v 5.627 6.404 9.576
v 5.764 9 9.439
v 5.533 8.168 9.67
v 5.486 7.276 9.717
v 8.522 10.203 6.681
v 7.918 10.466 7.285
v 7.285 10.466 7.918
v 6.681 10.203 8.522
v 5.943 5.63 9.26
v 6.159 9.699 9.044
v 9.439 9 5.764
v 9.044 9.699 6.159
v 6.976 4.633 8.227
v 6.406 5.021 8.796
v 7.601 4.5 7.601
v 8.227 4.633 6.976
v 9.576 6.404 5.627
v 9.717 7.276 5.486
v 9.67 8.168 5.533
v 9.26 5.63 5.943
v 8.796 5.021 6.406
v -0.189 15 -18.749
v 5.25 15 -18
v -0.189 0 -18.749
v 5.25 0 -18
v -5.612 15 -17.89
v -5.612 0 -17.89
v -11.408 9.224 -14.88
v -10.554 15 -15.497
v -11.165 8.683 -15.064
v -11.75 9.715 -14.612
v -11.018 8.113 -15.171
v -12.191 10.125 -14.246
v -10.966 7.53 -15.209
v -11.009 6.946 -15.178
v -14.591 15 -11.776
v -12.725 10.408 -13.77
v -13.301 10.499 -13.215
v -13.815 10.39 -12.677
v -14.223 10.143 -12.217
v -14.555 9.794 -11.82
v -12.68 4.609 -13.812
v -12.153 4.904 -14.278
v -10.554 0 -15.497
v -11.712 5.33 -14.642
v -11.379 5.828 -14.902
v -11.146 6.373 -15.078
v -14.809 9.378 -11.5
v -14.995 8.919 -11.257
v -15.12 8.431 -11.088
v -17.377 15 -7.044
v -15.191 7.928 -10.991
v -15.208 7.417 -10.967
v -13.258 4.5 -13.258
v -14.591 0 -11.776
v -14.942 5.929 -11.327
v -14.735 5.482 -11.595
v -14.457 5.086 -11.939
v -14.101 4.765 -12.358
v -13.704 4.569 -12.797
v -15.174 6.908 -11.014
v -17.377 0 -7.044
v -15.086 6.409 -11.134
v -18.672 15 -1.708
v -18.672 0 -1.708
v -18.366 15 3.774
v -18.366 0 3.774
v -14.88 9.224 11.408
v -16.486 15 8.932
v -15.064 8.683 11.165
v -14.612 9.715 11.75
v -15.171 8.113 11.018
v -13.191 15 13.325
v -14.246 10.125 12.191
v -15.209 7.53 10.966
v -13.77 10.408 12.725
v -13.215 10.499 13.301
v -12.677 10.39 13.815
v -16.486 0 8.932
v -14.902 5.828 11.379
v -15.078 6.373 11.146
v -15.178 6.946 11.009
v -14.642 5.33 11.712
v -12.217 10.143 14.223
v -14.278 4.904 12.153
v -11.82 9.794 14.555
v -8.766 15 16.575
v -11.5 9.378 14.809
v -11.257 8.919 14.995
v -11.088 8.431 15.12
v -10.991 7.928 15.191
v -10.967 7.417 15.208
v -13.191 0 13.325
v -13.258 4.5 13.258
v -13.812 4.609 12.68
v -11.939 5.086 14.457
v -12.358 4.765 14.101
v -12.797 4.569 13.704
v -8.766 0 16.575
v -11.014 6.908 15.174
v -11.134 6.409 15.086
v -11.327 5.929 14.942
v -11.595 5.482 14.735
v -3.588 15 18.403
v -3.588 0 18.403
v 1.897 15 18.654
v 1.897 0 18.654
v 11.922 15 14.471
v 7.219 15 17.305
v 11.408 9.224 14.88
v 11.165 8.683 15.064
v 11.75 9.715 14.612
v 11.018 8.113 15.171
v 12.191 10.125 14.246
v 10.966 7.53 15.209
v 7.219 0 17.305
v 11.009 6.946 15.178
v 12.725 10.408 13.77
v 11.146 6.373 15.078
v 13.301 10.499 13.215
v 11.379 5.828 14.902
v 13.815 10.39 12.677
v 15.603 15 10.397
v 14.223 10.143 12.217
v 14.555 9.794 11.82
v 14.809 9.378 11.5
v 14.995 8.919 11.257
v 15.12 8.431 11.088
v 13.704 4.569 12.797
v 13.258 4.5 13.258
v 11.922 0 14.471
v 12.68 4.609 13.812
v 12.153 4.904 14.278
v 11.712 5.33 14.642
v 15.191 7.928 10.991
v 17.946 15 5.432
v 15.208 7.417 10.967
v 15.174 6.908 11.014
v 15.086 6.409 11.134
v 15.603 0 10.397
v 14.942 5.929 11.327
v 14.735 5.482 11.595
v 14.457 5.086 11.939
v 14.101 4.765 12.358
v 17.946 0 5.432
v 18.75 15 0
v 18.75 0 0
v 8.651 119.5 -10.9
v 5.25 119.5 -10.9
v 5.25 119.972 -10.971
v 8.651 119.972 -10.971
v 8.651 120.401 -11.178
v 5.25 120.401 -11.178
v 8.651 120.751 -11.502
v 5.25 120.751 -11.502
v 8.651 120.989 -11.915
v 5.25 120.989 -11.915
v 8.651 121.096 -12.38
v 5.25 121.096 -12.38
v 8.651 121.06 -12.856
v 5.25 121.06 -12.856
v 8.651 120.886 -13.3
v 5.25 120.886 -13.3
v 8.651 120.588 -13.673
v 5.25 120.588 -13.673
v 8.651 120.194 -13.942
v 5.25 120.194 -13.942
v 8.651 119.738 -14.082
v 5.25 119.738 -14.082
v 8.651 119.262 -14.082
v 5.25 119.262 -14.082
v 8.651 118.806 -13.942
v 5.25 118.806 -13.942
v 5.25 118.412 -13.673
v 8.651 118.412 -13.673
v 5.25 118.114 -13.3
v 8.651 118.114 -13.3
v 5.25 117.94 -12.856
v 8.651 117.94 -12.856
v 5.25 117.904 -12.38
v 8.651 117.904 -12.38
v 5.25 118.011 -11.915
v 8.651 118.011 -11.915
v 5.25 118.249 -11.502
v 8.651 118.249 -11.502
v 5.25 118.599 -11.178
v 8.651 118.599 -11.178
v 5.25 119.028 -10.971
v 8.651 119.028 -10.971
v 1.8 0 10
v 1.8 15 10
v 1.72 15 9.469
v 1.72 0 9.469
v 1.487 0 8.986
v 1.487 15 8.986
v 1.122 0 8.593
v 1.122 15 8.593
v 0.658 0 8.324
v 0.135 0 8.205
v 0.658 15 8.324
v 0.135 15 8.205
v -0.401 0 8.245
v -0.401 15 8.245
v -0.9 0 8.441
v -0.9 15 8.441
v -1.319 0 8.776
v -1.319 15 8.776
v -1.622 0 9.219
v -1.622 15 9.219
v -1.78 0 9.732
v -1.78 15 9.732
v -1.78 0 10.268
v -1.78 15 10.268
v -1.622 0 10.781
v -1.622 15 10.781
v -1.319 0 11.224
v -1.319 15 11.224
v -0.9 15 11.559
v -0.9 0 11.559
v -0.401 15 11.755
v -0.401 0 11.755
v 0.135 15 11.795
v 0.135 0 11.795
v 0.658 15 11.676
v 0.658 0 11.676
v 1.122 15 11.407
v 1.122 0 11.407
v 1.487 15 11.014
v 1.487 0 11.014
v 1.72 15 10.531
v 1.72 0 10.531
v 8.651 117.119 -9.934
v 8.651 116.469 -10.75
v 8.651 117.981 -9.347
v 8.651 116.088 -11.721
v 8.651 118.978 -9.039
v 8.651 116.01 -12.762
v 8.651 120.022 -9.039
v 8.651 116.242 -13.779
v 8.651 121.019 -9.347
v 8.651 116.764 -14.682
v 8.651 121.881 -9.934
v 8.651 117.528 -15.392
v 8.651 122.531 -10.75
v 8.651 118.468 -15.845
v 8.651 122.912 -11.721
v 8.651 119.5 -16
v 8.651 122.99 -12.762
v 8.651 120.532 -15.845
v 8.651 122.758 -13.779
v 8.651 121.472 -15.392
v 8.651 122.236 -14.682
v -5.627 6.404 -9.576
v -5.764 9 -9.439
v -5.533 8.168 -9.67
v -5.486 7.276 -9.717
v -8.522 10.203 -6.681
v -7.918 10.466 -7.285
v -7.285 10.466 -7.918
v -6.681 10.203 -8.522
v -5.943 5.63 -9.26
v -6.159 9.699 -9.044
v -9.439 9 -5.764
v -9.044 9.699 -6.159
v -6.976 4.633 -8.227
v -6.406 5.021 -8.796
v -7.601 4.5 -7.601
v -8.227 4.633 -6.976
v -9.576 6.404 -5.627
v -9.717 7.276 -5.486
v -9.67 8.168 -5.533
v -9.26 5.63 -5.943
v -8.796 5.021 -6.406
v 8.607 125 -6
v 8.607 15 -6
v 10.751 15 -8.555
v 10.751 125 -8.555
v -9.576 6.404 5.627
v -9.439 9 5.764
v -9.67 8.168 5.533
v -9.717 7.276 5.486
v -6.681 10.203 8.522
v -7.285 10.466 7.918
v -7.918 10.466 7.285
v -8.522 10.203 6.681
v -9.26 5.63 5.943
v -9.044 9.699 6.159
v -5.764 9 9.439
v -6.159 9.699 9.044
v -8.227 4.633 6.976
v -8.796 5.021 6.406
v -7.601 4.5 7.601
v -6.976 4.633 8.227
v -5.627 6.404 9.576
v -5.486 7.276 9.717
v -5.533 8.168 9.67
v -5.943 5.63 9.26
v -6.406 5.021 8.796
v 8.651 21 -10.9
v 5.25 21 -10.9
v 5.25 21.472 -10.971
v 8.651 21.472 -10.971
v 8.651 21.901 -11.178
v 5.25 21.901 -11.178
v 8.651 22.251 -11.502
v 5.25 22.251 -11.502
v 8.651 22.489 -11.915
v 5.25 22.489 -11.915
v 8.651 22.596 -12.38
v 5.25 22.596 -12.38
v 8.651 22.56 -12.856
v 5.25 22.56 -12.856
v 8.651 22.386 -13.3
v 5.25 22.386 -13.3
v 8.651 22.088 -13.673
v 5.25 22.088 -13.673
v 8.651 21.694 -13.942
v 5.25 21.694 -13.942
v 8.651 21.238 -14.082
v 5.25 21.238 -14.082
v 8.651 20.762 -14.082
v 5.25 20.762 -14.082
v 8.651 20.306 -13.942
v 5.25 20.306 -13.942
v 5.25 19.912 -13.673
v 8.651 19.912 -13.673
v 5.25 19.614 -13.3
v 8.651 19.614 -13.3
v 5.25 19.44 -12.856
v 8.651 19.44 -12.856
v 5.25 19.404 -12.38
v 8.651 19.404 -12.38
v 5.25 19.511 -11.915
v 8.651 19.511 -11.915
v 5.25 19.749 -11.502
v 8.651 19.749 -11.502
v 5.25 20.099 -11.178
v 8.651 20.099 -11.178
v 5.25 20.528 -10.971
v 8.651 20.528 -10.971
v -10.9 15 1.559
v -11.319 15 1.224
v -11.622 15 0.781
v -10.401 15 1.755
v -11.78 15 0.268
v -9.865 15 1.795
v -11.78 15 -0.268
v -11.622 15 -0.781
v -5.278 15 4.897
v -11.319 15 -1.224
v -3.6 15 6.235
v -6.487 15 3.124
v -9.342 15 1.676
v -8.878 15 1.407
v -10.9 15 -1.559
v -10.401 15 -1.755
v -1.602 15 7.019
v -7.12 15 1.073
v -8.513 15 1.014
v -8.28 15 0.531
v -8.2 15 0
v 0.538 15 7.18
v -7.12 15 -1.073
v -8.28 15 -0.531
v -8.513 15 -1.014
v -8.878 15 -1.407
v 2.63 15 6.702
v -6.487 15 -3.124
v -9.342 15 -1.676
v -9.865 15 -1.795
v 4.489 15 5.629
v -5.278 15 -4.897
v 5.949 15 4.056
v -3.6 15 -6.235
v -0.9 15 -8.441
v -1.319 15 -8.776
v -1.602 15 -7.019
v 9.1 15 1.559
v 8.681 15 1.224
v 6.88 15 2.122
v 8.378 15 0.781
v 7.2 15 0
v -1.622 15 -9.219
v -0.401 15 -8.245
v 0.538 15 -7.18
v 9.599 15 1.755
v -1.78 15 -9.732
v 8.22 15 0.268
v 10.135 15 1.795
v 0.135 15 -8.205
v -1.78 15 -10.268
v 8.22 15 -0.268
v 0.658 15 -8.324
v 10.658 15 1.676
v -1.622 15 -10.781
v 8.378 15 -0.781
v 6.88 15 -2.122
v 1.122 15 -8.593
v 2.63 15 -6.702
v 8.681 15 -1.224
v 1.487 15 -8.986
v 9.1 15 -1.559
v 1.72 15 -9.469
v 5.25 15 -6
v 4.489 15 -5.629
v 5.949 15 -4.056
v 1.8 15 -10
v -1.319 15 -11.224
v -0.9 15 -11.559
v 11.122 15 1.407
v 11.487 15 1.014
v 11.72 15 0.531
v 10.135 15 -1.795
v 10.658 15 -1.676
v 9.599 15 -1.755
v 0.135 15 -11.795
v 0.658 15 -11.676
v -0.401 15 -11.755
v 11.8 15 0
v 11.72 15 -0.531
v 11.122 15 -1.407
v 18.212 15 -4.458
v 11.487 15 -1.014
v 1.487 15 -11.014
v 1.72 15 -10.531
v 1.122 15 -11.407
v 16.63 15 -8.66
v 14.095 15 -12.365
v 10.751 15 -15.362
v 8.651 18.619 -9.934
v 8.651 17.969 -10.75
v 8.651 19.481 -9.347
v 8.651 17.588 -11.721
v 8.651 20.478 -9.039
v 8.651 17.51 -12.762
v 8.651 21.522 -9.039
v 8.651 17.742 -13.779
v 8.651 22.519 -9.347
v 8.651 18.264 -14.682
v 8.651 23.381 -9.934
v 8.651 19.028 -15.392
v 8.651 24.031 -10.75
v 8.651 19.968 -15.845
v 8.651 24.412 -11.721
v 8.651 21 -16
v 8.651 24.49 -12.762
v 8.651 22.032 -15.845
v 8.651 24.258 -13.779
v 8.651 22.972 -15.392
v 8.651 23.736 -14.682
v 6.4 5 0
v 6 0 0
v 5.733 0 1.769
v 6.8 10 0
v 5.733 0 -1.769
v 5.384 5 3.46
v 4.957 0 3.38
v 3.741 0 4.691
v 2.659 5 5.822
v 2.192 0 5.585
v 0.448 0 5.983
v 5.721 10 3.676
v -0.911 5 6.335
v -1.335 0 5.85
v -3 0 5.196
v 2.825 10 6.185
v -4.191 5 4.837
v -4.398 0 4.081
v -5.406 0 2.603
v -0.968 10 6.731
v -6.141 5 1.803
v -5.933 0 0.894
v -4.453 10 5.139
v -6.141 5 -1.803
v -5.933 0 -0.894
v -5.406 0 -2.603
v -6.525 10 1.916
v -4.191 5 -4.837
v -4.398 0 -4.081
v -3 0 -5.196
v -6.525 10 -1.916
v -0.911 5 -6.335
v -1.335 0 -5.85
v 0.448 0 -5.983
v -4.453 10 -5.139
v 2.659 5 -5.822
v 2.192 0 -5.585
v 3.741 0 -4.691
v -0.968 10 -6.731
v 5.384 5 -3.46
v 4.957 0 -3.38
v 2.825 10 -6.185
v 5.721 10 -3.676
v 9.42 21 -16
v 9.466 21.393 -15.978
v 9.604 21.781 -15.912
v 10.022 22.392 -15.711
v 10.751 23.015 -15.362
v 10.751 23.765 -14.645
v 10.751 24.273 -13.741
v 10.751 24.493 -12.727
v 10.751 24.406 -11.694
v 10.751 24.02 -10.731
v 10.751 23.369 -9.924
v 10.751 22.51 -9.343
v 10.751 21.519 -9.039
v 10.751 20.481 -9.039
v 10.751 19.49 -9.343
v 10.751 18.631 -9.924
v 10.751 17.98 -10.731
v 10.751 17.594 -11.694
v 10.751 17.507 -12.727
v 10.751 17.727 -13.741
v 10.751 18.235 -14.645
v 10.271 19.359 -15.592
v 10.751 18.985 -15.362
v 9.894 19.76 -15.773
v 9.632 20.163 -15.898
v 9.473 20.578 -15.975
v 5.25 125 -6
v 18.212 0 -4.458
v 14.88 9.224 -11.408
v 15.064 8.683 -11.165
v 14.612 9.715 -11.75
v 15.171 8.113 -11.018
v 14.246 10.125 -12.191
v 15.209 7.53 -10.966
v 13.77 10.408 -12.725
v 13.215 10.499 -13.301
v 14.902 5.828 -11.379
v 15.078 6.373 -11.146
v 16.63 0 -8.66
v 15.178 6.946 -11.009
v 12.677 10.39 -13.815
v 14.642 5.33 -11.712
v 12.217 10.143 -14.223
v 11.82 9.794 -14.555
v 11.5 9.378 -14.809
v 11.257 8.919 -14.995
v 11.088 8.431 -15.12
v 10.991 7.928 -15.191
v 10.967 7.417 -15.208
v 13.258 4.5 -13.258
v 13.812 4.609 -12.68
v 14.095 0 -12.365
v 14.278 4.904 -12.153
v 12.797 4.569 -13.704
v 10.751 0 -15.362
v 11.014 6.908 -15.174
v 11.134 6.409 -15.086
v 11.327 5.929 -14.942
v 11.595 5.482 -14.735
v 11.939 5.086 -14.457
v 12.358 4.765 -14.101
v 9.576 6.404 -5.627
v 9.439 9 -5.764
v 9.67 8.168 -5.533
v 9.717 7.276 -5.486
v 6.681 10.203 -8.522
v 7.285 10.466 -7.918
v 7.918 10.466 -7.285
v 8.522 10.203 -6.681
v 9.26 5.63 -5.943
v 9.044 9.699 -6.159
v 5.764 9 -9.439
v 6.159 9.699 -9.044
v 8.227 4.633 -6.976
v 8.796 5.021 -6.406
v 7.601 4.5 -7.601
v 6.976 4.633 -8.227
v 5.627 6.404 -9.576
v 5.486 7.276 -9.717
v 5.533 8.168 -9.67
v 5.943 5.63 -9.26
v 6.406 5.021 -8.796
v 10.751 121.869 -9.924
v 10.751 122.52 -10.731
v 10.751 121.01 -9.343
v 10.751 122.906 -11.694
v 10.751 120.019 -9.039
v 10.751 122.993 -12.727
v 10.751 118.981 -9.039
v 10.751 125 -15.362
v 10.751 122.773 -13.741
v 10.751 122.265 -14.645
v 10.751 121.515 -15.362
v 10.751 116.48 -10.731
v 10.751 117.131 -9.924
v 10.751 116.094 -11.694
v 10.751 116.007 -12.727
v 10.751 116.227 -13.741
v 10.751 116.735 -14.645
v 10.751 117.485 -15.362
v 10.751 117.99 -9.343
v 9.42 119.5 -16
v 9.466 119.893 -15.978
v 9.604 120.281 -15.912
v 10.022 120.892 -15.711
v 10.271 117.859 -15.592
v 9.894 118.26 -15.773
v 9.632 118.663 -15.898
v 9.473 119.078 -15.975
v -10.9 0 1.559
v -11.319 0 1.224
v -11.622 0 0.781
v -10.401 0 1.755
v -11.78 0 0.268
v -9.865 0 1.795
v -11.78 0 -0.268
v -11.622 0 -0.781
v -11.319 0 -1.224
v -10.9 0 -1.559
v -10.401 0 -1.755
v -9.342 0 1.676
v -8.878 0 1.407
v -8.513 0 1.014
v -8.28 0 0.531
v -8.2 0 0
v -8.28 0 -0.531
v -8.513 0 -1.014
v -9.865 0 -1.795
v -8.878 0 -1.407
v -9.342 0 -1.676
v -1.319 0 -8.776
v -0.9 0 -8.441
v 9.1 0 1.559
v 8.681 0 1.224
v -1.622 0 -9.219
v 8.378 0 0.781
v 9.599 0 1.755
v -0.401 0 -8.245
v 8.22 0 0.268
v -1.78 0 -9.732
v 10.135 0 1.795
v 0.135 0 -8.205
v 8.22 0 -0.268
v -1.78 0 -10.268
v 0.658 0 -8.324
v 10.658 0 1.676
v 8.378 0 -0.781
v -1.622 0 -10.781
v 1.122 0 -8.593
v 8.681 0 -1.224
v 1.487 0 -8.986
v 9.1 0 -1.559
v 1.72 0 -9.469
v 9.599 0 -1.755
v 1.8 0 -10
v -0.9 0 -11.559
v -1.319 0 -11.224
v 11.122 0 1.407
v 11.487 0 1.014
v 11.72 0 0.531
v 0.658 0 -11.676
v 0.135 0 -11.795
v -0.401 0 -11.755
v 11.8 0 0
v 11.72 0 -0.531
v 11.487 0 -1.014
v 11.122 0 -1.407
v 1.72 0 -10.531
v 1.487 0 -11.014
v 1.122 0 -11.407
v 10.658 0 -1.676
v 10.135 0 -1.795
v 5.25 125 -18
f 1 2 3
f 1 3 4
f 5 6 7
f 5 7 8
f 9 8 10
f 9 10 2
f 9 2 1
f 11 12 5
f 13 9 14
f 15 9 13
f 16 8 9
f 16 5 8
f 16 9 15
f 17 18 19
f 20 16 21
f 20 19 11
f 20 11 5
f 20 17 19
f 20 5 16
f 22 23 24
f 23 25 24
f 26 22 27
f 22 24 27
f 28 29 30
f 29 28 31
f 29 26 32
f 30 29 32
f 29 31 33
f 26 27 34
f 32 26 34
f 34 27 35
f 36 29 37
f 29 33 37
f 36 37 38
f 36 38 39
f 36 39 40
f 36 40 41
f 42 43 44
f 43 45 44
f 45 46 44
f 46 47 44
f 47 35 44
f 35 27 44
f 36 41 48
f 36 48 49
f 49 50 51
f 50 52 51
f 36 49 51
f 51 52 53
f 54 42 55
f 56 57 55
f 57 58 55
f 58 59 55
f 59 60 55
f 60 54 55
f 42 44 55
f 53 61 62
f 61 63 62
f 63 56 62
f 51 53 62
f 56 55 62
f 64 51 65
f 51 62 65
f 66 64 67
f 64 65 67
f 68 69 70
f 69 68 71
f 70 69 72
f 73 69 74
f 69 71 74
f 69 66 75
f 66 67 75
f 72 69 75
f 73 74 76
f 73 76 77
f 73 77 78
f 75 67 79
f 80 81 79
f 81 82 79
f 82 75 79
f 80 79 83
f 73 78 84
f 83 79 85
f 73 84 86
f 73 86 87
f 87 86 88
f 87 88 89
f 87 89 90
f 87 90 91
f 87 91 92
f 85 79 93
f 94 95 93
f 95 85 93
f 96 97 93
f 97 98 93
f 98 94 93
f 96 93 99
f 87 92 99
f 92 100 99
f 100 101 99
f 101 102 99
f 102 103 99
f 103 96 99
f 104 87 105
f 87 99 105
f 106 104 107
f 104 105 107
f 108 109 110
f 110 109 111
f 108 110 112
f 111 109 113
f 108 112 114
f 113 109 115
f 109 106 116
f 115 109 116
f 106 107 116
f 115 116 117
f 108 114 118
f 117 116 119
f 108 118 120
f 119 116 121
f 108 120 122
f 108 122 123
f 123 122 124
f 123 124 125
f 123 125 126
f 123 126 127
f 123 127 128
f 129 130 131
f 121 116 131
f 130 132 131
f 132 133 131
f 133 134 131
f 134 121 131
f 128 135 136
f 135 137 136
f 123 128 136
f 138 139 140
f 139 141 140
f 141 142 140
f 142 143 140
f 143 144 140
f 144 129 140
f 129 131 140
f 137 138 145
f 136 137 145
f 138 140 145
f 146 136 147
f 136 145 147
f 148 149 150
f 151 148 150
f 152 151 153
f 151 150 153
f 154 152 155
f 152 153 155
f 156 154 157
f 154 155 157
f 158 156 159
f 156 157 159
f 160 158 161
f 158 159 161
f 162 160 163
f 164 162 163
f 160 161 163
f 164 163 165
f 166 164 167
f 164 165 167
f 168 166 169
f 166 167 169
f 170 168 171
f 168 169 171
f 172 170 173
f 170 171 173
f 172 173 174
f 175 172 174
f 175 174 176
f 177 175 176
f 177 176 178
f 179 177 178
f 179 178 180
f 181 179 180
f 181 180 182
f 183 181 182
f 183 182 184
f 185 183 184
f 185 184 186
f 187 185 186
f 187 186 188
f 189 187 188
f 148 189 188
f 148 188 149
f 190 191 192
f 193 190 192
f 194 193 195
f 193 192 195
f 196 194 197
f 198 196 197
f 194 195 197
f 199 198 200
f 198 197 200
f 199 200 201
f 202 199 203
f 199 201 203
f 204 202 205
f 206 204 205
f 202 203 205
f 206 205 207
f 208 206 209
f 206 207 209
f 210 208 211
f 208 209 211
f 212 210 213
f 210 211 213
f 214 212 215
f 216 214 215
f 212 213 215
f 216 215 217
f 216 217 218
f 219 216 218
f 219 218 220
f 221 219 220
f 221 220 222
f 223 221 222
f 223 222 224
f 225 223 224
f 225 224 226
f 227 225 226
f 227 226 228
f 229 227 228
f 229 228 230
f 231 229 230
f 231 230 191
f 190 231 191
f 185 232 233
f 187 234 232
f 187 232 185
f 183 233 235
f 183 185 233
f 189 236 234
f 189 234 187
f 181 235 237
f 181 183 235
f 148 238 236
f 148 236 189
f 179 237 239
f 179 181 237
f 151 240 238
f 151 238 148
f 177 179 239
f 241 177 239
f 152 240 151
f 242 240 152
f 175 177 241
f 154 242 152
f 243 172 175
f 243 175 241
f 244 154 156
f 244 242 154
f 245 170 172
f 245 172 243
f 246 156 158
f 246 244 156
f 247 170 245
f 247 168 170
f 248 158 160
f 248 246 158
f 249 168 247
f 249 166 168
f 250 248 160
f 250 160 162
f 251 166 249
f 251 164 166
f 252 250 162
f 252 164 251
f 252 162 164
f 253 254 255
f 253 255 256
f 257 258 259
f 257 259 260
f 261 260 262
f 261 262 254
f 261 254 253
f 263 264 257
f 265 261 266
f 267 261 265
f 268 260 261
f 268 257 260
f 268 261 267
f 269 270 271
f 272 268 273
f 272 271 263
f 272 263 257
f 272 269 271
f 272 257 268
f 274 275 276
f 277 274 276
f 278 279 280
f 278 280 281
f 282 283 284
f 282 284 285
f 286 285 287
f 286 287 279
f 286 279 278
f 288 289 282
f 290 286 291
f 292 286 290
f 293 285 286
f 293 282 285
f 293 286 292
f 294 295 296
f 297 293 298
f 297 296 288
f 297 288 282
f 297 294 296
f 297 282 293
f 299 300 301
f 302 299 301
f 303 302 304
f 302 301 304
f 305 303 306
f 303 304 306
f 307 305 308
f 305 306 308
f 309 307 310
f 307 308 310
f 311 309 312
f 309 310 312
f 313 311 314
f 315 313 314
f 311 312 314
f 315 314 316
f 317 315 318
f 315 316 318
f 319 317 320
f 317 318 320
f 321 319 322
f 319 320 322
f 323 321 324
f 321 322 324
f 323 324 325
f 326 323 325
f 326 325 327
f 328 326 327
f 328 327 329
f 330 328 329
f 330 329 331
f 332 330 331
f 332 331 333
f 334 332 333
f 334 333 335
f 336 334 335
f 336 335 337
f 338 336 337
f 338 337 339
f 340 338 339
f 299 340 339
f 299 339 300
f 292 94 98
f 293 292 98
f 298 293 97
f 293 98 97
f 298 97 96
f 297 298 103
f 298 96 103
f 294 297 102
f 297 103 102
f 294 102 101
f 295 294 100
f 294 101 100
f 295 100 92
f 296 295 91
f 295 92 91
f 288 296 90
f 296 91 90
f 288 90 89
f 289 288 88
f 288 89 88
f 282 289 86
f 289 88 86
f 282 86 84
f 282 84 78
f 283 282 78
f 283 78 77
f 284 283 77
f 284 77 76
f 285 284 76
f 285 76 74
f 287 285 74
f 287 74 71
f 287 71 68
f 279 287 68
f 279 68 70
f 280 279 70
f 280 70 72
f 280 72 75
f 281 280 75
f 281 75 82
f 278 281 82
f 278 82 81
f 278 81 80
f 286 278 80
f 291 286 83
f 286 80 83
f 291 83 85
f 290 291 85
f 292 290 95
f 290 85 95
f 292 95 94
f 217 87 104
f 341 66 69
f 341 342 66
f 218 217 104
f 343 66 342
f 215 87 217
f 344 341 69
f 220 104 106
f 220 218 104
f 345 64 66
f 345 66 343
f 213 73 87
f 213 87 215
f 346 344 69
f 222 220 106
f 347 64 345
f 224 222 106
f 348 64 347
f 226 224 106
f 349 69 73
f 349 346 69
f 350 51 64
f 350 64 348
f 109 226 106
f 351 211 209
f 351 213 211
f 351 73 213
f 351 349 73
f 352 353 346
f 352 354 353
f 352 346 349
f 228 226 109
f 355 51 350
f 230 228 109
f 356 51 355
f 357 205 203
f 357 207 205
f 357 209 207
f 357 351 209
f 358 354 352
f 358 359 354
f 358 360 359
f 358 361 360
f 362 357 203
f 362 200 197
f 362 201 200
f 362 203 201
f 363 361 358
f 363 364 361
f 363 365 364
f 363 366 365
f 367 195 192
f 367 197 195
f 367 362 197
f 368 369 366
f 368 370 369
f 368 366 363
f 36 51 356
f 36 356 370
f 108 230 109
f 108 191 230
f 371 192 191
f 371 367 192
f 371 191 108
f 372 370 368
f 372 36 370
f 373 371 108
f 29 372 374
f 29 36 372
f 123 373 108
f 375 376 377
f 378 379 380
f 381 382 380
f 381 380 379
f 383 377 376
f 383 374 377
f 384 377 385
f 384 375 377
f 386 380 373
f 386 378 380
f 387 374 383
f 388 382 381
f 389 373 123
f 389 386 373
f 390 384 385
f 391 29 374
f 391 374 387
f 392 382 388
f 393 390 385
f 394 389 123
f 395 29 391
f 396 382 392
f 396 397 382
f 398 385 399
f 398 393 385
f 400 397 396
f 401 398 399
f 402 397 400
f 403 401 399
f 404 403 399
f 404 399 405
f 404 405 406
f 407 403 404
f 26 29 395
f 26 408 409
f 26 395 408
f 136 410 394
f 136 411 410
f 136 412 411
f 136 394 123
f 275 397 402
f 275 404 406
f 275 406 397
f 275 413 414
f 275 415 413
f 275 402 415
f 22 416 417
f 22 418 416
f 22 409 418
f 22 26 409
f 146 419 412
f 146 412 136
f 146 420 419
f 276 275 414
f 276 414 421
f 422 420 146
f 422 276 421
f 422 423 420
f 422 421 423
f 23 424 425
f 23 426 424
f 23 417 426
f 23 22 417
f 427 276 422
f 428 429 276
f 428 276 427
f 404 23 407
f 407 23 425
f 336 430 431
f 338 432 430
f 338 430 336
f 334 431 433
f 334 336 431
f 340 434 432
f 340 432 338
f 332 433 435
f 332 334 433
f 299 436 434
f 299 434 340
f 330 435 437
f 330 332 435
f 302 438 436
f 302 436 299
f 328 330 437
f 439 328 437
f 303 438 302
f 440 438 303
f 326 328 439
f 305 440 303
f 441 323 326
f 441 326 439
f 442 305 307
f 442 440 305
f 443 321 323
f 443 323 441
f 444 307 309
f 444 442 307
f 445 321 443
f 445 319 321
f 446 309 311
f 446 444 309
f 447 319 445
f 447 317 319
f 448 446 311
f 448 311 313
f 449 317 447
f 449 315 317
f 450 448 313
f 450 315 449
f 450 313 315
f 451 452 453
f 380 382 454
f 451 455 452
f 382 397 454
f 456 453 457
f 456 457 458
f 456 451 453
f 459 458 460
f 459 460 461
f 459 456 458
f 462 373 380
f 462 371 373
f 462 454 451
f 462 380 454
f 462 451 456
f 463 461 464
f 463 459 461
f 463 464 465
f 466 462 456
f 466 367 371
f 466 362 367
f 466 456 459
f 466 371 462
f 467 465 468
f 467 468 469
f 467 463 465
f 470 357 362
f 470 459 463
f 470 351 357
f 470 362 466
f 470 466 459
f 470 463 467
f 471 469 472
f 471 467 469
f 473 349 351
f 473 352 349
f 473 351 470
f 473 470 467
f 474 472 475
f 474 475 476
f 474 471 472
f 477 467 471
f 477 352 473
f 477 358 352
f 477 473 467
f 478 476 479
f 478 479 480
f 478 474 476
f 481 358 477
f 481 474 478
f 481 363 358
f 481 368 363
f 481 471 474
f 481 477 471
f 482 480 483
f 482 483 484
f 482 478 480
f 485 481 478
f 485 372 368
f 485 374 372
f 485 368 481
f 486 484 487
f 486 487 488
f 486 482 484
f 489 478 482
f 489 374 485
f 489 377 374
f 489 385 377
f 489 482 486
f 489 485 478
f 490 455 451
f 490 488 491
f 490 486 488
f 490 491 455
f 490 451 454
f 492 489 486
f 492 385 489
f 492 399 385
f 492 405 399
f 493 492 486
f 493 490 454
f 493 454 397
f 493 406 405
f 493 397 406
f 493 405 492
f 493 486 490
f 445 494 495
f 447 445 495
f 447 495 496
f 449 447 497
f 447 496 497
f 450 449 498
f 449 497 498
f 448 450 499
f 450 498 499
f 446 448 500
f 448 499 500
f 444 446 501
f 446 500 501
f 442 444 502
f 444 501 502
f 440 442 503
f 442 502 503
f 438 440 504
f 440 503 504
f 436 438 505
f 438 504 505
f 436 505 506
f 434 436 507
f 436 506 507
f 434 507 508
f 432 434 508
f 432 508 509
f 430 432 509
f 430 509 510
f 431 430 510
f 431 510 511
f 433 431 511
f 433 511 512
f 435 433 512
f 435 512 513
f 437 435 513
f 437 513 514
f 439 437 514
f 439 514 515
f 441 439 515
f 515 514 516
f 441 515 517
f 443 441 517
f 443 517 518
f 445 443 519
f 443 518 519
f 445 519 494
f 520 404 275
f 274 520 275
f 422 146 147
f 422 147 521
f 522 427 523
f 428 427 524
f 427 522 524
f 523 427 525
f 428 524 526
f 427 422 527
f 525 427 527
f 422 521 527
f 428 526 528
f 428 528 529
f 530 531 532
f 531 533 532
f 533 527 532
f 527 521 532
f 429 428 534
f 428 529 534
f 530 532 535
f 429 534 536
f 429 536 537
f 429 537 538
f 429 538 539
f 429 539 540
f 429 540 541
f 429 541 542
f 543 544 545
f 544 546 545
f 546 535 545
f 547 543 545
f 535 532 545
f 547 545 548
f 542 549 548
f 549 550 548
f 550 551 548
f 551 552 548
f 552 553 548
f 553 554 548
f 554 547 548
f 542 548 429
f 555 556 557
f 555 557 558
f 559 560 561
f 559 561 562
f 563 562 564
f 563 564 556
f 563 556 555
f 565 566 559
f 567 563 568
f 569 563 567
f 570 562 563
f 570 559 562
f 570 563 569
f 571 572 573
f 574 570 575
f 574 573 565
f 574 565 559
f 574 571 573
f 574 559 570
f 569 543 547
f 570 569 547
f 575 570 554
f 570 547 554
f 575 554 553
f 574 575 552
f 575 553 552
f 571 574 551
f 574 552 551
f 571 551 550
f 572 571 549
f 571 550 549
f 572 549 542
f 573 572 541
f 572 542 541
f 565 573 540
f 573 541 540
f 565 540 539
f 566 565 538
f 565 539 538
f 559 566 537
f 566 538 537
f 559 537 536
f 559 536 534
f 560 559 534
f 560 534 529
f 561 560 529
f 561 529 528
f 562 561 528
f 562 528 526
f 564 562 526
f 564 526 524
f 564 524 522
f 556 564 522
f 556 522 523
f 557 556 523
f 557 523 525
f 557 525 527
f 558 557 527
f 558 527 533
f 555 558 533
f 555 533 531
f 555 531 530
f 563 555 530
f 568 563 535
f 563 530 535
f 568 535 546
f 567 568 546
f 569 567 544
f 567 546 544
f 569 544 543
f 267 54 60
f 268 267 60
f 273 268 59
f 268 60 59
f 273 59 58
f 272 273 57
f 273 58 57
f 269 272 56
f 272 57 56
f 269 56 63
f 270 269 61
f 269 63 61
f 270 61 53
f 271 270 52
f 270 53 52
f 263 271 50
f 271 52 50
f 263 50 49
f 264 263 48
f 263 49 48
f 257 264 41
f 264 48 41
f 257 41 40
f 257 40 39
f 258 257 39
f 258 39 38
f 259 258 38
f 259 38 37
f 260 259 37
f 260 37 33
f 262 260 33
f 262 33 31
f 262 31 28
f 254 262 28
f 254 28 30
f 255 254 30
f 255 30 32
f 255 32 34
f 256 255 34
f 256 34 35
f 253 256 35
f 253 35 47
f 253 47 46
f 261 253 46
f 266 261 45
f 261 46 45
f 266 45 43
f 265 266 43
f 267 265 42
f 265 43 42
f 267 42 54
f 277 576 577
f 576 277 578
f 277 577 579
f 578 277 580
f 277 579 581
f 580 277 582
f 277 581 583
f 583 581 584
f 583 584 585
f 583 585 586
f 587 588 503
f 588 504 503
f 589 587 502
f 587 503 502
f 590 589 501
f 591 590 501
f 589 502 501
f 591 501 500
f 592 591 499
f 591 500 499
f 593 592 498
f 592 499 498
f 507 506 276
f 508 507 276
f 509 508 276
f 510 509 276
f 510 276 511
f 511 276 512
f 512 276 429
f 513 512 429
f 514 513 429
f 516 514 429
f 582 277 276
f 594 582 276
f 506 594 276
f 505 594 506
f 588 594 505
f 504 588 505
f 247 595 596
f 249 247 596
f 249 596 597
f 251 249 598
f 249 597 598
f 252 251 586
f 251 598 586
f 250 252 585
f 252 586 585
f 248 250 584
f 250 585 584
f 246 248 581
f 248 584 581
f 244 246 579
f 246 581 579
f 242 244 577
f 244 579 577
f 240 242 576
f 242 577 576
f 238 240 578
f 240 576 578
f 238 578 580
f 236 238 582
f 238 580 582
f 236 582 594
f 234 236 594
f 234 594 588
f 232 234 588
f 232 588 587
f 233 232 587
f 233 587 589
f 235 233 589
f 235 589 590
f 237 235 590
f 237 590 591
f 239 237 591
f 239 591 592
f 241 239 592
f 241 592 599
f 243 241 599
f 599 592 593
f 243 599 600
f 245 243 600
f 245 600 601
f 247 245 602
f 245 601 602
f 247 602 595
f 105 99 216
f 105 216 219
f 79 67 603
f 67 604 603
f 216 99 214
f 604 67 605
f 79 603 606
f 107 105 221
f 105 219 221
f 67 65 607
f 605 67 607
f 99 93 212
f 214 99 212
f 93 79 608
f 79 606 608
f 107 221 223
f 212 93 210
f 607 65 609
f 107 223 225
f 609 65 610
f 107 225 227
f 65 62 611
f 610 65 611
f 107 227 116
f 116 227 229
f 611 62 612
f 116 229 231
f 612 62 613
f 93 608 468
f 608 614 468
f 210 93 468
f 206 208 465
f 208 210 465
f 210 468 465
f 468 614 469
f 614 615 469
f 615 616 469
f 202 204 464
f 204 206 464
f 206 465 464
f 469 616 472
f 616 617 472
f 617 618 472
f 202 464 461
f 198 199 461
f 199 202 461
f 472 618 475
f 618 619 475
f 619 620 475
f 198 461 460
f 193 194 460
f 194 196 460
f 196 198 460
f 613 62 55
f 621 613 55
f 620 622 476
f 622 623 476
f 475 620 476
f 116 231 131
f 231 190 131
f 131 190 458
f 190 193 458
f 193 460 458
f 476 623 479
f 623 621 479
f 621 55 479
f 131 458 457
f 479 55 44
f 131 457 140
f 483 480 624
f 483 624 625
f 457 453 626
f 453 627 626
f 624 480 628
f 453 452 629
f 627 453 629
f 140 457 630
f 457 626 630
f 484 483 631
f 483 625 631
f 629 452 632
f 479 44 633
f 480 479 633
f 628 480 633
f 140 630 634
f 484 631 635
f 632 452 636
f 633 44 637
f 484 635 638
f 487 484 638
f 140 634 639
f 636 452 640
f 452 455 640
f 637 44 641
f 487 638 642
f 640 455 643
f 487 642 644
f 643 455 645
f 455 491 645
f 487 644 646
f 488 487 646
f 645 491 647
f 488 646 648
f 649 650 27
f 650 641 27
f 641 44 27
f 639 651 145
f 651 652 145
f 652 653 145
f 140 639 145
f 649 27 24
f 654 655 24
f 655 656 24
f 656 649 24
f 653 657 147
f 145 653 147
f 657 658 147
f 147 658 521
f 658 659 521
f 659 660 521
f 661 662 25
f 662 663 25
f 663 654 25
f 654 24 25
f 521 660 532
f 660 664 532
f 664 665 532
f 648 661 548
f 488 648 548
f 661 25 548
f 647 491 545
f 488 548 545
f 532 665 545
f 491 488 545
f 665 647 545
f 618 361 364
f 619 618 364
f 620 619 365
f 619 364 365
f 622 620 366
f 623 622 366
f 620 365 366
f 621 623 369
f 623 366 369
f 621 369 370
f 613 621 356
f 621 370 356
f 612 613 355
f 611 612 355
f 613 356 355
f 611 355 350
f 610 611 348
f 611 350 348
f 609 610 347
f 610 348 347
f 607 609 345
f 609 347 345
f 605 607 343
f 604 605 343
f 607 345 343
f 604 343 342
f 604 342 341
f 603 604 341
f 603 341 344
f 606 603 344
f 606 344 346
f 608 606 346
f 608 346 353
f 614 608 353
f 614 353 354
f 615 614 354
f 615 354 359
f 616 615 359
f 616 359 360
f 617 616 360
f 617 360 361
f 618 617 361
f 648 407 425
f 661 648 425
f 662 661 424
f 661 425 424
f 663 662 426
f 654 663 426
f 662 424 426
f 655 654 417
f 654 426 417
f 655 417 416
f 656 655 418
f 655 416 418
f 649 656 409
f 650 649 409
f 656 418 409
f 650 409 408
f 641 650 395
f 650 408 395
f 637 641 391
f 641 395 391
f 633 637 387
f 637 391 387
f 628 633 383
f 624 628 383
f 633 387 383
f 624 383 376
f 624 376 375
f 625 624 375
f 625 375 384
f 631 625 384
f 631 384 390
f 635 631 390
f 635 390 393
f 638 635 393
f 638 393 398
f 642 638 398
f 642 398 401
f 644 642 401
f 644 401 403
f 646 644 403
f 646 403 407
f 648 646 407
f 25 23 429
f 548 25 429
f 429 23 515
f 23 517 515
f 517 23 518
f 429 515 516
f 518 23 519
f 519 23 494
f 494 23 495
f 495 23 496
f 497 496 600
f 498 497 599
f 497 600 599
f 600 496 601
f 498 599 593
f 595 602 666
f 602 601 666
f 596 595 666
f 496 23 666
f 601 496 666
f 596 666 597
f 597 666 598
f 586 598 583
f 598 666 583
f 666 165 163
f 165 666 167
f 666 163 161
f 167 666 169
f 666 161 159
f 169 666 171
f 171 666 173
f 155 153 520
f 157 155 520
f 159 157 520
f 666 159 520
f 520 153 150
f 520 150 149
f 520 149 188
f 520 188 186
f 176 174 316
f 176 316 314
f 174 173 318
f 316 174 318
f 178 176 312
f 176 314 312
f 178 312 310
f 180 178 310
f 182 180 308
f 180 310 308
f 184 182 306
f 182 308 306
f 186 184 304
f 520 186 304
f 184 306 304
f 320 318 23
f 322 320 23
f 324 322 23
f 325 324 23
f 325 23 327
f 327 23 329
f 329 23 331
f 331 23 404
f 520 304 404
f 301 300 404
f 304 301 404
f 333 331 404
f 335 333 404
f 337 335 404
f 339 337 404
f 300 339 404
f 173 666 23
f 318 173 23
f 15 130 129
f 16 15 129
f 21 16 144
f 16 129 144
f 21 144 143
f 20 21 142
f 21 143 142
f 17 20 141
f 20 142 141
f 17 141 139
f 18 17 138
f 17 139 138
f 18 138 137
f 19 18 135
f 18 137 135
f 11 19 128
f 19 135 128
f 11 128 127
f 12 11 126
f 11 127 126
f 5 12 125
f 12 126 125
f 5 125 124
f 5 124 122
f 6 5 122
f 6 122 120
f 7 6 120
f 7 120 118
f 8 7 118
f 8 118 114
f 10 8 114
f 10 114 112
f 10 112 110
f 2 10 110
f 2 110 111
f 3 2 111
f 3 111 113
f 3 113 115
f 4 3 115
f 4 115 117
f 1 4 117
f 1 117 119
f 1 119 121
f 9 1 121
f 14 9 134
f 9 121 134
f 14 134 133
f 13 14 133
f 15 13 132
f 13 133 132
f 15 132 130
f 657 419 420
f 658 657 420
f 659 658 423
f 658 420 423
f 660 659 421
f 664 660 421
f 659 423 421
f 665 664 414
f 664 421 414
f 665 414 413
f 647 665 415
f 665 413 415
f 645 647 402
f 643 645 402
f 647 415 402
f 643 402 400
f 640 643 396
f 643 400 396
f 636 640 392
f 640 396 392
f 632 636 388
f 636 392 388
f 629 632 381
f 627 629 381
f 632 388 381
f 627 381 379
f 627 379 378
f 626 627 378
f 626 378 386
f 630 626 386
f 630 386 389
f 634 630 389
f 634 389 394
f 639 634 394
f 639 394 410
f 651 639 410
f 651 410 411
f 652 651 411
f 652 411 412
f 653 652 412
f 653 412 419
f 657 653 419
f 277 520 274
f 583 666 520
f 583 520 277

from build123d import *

# Parameters (mm, degrees)
SKIZZE1_R                        = 18.75
AUFSATZ_LINEAR_AUSTRAGEN1_DEPTH  = 15
SKIZZE2_R                        = 1.8
SKIZZE2_R_2                      = 1.65
SCHNITT_LINEAR_AUSTRAGEN1_DEPTH  = 16
AUFSATZ_LINEAR_AUSTRAGEN2_DEPTH  = 110
SKIZZE10_R                       = 3
SCHNITT_LINEAR_AUSTRAGEN5_DEPTH  = 8
KREISMUSTER1_COUNT               = 4
SKIZZE11_R                       = 1.6
SCHNITT_LINEAR_AUSTRAGEN6_DEPTH  = 14.5000001
SKIZZE16_R                       = 3.5
SCHNITT_LINEAR_AUSTRAGEN10_DEPTH = 2.1
SCHNITT_LINEAR_AUSTRAGEN11_DEPTH = 126.0000001


with BuildPart() as part:
    # Skizze1 → Aufsatz-Linear austragen1 (new body)
    with BuildSketch(Plane(origin=(0, 0, 0), x_dir=(1, 0, 0), z_dir=(0, 1, 0))):
        Circle(SKIZZE1_R)
    extrude(amount=AUFSATZ_LINEAR_AUSTRAGEN1_DEPTH)

    # Skizze2 → Schnitt-Linear austragen1 (cut, through all)
    with BuildSketch(Plane(origin=(0, 15, 0), x_dir=(1, 0, 0), z_dir=(0, 1, 0))):
        with Locations((0, 10)):
            Circle(SKIZZE2_R)
        with Locations((10, 0)):
            Circle(SKIZZE2_R)
        with Locations((0, -10)):
            Circle(SKIZZE2_R)
        with Locations((-10, 0)):
            Circle(SKIZZE2_R)
        Circle(SKIZZE2_R_2)
    extrude(amount=-SCHNITT_LINEAR_AUSTRAGEN1_DEPTH, mode=Mode.SUBTRACT)

    # Skizze4 → Aufsatz-Linear austragen2 (add)
    with BuildSketch(Plane(origin=(0, 15, 0), x_dir=(1, 0, 0), z_dir=(0, 1, 0))):
        with BuildLine():
            Line((5.25, 17), (5.25, 6))
            Line((5.25, 6), (8.607298894, 6))
            Line((8.607298894, 6), (10.750900369, 8.554644759))
            Line((10.750900369, 8.554644759), (10.750900369, 15.361661409))
            ThreePointArc((10.750900369, 15.361661409), (8.108477711, 16.906066639), (5.25, 18))
            Line((5.25, 18), (5.25, 17))
        make_face()
    extrude(amount=AUFSATZ_LINEAR_AUSTRAGEN2_DEPTH)

    # Skizze10 → Schnitt-Linear austragen5 (cut)
    with BuildSketch(Plane(origin=(13.258252147, 0, 13.258252147), x_dir=(0, -1, 0), z_dir=(0.707106781, 0, 0.707106781))):
        with Locations((-7.5, 0)):
            Circle(SKIZZE10_R)
    schnitt_linear_austragen5 = extrude(amount=-SCHNITT_LINEAR_AUSTRAGEN5_DEPTH, mode=Mode.SUBTRACT)

    # Kreismuster1: Schnitt-Linear austragen5 ×4 about axis
    kreismuster1_axis = Axis((0, 0, 0), (0, 1, 0))
    for i in range(1, KREISMUSTER1_COUNT):
        add(schnitt_linear_austragen5.rotate(kreismuster1_axis, i * 360 / KREISMUSTER1_COUNT), mode=Mode.SUBTRACT)

    # Skizze11 → Schnitt-Linear austragen6 (cut, through all)
    with BuildSketch(Plane.ZY.offset(-5.25)):
        with Locations((-12.5, 119.5)):
            Circle(SKIZZE11_R)
        with Locations((-12.5, 21)):
            Circle(SKIZZE11_R)
    extrude(amount=-SCHNITT_LINEAR_AUSTRAGEN6_DEPTH, mode=Mode.SUBTRACT)

    # Skizze16 → Schnitt-Linear austragen10 (cut)
    with BuildSketch(Plane(origin=(10.750900369, 0, 0), x_dir=(0, 0, -1), z_dir=(1, 0, 0))):
        with Locations((12.5, 119.5)):
            Circle(SKIZZE16_R)
        with Locations((12.5, 21)):
            Circle(SKIZZE16_R)
    extrude(amount=-SCHNITT_LINEAR_AUSTRAGEN10_DEPTH, mode=Mode.SUBTRACT)

    # Skizze17 → Schnitt-Linear austragen11 (cut, through all)
    with BuildSketch(Plane(origin=(0, 125, 0), x_dir=(1, 0, 0), z_dir=(0, 1, 0))):
        with BuildLine():
            Line((5.25, 18), (10.750900369, 15.361661409))
            ThreePointArc((10.750900369, 15.361661409), (8.108477711, 16.906066639), (5.25, 18))
        make_face()
    extrude(amount=-SCHNITT_LINEAR_AUSTRAGEN11_DEPTH, mode=Mode.SUBTRACT)

    # Skizze18 → Schnitt-Rotation1 (revolve, cut)
    with BuildSketch(Plane.XY):
        Polygon((0, 0), (6, 0), (7.2, 15), (0, 15), align=None)
    revolve(axis=Axis((0, 15, 0), (0, -1, 0)), mode=Mode.SUBTRACT)


solid = part.part
